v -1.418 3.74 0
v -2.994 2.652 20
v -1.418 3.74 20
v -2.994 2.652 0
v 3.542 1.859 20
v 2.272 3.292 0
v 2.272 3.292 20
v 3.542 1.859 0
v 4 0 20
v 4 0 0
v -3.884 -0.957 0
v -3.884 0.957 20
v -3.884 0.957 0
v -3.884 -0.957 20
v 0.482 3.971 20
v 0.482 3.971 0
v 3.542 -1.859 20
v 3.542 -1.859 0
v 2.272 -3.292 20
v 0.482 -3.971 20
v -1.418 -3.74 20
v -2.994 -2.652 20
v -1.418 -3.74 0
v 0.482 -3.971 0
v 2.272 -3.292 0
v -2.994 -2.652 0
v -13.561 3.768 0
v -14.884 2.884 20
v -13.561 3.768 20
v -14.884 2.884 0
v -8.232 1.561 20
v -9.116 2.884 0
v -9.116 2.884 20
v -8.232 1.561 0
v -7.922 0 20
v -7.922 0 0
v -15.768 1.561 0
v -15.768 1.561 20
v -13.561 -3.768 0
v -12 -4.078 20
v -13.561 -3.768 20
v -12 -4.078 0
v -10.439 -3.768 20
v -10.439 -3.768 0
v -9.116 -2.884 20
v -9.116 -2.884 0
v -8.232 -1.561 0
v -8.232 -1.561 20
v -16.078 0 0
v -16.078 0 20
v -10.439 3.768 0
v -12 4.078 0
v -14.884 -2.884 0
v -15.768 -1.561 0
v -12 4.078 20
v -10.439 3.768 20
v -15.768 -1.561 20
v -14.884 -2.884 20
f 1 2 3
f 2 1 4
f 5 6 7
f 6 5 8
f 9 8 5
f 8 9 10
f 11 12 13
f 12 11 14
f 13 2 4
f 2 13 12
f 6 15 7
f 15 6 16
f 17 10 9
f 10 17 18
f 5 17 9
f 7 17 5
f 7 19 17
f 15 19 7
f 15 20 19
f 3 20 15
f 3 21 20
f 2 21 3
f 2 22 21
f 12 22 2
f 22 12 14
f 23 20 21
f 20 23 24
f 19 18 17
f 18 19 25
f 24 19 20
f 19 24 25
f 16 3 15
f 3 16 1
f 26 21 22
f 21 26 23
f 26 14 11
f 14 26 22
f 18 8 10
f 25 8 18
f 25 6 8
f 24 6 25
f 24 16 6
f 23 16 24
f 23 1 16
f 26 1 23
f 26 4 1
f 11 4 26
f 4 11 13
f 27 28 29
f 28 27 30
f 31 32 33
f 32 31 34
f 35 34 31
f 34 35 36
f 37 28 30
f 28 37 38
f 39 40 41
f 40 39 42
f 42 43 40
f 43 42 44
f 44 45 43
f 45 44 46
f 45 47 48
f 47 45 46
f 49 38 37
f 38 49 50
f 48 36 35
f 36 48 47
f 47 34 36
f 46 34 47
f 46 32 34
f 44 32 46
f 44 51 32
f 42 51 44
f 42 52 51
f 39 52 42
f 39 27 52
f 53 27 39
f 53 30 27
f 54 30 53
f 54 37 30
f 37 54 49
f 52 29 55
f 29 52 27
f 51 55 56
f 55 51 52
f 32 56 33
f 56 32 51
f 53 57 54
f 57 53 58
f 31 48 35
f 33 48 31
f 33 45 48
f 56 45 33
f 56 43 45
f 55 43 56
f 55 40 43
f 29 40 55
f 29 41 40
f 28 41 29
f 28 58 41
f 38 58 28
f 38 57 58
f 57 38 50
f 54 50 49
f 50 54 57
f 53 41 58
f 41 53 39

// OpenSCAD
// polyholes - correct diameter for printing holes
//
// See http://hydraraptor.blogspot.com/2011/02/polyholes.html
//
// inspired by Josef Prusa (Prusa i3)
//
// GNU GPL v3
// R.E. 2017.06



function polyhole_n(r) = max(round(4 * r),3);
function polyhole_radius(r) = r / cos (180 / polyhole_n(r));

module polyhole(h, r, center = false) {
    rotate([0,0,0])
        cylinder(h = h, r = polyhole_radius(r), center = center, $fn = polyhole_n(r));
}


//test
high=20;
radius=4;
cylinder(high,r=radius,center=false);
translate([-3*radius,0,0])
  polyhole(high,radius,center=false);
echo("<b>Radius=</b>",radius);
echo("<b>polyhole_rad_n=</b>",polyhole_n(radius));
echo("<b>polyhole_radius=</b>",polyhole_radius(radius));
